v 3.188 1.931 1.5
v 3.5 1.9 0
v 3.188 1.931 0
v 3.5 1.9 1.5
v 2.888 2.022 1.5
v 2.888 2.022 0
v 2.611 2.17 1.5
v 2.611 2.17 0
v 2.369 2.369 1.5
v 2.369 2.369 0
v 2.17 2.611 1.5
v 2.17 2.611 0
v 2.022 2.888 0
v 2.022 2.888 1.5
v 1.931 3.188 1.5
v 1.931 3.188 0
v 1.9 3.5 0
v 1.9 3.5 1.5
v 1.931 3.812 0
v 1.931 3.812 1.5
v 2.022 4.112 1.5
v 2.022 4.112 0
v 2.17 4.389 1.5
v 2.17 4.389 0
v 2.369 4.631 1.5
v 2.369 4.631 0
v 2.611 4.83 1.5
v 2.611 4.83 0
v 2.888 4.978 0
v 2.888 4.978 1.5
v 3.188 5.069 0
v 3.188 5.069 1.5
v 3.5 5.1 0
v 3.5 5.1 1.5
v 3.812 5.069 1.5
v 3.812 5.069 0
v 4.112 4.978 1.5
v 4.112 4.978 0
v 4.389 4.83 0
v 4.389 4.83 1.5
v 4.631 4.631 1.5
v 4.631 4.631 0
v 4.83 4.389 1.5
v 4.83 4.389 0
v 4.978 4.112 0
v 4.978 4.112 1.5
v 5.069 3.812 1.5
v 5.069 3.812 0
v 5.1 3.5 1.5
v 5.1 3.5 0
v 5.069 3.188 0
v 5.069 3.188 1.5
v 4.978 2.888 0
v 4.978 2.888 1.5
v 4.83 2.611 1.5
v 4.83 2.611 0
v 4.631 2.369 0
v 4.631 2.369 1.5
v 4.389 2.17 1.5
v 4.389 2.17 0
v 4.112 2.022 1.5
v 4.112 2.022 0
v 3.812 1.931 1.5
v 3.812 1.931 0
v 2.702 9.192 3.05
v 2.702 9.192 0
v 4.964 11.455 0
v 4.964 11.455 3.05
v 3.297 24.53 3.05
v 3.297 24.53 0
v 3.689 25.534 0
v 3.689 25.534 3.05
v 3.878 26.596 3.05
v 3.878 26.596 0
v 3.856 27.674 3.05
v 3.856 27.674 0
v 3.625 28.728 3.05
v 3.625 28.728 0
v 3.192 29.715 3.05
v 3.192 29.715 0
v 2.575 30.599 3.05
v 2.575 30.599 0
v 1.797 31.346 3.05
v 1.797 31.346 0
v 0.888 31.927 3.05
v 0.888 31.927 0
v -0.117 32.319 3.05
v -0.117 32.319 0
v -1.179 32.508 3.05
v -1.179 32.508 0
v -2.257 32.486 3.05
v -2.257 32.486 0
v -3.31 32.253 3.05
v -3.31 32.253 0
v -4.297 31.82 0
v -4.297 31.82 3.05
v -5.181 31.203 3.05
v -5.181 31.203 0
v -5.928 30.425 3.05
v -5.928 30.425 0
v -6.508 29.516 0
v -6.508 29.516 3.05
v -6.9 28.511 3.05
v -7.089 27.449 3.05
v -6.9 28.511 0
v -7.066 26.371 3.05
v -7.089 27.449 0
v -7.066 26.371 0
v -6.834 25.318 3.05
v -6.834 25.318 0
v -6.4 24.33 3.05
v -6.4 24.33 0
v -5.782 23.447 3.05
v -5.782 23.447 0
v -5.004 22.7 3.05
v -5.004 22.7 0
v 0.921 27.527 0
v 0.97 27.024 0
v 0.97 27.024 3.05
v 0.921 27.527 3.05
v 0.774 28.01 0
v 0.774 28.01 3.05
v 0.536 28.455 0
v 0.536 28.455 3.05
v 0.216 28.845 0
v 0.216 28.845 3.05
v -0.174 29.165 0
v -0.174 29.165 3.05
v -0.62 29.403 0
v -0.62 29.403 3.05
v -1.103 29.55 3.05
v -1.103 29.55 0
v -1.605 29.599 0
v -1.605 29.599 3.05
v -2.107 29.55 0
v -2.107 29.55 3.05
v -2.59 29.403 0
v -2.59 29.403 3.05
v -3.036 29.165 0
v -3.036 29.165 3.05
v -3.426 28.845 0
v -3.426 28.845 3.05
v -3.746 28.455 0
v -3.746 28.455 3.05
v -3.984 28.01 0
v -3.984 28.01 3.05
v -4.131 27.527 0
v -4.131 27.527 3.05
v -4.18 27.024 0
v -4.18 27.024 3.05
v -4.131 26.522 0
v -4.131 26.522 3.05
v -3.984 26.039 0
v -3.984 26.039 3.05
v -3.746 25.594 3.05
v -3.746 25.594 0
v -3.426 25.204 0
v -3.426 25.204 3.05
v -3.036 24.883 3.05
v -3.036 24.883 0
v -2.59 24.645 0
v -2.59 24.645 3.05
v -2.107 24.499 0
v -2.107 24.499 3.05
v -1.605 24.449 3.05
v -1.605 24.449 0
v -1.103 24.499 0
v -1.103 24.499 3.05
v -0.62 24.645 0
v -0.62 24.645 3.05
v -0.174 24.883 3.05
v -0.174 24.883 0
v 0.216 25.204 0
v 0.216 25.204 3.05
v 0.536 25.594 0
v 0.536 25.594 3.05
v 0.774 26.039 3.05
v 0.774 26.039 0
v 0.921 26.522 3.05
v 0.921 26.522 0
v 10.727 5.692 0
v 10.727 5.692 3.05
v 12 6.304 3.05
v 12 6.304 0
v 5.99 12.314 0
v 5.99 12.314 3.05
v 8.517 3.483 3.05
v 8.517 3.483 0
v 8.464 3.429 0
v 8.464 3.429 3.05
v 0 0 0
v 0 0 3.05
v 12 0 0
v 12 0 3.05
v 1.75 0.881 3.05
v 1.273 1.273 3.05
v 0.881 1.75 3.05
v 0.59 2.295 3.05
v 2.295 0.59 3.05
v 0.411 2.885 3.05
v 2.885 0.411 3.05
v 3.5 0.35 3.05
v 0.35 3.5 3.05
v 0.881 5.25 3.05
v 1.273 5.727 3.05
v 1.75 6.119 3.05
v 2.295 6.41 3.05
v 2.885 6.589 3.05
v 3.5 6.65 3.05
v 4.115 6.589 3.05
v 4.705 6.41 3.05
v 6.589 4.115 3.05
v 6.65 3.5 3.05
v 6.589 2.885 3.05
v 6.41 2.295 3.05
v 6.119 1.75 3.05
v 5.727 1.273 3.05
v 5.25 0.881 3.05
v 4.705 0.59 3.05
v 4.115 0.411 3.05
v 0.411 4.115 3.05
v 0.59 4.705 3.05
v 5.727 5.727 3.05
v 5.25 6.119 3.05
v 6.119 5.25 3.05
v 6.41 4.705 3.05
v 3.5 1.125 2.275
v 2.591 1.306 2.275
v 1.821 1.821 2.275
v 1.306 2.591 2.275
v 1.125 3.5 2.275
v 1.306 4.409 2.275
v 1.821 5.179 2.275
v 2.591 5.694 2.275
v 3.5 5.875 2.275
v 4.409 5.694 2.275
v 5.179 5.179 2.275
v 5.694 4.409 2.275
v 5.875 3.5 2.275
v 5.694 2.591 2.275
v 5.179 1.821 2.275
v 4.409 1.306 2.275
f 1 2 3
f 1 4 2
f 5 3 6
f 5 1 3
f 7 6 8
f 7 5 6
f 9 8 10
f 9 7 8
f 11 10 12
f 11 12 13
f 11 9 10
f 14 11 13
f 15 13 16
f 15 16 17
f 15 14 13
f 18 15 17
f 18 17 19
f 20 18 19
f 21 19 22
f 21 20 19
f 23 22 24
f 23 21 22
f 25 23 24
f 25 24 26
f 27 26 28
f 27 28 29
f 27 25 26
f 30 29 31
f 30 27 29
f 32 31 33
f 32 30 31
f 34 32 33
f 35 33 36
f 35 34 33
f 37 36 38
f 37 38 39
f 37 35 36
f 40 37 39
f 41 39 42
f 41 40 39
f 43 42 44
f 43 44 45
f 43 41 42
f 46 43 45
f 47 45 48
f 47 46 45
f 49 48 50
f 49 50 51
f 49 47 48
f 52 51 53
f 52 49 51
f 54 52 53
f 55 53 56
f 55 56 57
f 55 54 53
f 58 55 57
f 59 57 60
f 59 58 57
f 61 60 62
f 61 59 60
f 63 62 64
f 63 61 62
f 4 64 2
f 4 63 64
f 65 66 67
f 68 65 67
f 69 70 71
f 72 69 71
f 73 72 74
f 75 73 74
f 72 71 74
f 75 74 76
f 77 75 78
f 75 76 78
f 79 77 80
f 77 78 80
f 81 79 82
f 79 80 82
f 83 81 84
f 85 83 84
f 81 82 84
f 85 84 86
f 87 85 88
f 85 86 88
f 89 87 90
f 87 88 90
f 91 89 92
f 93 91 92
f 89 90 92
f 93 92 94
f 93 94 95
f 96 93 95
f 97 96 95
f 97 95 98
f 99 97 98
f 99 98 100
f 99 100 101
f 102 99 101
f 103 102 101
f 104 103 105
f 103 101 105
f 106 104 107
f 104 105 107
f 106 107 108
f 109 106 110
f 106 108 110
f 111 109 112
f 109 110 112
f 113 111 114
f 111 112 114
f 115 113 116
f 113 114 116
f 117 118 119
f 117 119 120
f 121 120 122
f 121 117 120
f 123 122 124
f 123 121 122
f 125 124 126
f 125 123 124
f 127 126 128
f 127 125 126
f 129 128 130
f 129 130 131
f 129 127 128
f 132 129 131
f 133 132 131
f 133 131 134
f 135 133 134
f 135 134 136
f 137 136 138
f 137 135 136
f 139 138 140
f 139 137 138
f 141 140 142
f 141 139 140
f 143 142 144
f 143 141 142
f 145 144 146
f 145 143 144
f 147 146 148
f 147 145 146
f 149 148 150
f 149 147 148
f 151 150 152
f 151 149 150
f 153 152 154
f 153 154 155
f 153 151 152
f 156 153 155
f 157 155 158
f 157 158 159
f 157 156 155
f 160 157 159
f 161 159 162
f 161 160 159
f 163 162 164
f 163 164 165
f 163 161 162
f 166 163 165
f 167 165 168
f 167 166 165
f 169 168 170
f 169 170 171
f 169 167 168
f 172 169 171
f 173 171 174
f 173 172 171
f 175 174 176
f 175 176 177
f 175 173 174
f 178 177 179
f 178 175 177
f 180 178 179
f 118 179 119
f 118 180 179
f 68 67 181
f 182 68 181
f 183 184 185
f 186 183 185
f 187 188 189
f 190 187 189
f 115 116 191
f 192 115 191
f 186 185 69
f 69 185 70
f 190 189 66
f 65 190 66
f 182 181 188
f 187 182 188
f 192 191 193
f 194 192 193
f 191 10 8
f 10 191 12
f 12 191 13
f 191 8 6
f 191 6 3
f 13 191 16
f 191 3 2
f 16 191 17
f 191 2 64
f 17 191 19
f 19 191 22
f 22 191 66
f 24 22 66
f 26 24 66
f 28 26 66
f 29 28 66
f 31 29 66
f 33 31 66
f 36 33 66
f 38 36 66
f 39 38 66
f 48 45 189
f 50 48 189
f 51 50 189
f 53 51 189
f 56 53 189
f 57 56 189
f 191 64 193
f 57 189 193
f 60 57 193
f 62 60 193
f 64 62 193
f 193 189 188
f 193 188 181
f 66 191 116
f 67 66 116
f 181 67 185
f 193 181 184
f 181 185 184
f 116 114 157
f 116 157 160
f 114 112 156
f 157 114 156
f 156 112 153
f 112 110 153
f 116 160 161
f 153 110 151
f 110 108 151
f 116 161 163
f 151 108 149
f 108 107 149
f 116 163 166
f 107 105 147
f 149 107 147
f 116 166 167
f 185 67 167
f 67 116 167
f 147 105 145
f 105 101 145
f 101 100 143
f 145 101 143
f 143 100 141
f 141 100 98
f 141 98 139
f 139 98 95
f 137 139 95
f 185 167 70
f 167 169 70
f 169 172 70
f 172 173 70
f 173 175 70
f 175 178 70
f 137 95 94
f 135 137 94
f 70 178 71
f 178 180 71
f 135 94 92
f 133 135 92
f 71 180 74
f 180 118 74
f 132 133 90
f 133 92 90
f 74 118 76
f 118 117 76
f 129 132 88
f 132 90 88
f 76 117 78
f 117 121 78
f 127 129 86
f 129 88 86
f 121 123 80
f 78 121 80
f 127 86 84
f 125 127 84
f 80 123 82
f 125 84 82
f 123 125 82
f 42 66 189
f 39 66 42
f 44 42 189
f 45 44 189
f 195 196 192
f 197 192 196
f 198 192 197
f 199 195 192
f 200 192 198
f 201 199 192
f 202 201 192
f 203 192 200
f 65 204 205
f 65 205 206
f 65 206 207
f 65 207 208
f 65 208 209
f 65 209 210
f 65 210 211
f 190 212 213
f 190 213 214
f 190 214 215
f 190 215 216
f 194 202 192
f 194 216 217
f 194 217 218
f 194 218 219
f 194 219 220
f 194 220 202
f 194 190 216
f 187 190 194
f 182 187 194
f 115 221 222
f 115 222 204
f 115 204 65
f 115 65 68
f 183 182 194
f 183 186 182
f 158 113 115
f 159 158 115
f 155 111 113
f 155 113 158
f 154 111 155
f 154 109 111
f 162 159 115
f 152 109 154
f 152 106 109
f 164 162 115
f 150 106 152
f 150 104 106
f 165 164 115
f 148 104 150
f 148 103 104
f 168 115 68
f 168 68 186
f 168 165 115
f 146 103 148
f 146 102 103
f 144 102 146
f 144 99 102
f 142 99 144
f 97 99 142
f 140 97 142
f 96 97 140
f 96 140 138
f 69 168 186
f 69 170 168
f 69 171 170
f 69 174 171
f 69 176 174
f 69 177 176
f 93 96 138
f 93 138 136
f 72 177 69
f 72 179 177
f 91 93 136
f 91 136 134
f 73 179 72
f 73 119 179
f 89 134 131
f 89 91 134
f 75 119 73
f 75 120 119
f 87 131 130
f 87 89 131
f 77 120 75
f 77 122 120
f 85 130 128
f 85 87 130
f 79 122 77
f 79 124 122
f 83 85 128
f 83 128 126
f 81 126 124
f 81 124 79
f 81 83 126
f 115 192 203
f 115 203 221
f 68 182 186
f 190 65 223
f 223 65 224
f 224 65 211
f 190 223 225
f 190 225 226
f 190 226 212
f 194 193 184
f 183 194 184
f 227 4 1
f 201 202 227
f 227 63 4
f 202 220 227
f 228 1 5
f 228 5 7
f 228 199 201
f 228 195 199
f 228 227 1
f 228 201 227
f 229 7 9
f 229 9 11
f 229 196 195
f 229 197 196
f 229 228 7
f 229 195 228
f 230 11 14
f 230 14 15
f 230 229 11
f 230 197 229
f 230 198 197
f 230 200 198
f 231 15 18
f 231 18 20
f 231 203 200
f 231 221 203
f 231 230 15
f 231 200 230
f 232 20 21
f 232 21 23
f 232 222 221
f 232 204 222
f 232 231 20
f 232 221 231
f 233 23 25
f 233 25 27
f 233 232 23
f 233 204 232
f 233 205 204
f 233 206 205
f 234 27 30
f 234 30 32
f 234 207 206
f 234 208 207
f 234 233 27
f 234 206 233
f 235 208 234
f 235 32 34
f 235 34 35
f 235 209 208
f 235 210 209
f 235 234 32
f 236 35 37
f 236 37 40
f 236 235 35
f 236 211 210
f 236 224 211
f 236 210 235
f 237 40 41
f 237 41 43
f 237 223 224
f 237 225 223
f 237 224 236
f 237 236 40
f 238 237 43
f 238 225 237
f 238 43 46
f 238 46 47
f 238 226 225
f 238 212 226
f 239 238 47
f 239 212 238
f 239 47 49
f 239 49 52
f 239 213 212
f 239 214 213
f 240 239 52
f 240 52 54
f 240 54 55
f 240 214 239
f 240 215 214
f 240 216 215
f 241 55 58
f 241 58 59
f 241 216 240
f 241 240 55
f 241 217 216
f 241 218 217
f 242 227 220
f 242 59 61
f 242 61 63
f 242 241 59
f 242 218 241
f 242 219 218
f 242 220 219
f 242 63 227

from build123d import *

# Parameters (mm, degrees)
SKETCH1_R           = 1.5
SKETCH1_R_2         = 2.575
BOSS_EXTRUDE1_DEPTH = 3.05


with BuildPart() as part:
    # Sketch1 → Boss-Extrude1 (new body)
    with BuildSketch(Plane.XY):
        with BuildLine():
            Line((-5.003856518, 22.700252006), (0, 0))
            Line((0, 0), (12, 0))
            Line((12, 0), (12, 6.303908615))
            Line((12, 6.303908615), (5.98959236, 12.314316255))
            Line((5.98959236, 12.314316255), (3.296868681, 24.529995477))
            ThreePointArc((3.296868681, 24.529995477), (-2.788944901, 32.395396494), (-5.003856518, 22.700252006))
        make_face()
        with Locations((3.5, 3.5)):
            Circle(SKETCH1_R, mode=Mode.SUBTRACT)
        Polygon((10.727207794, 5.692209589), (8.517499103, 3.482500897), (8.464466094, 3.429467889), (2.701545827, 9.192388155), (4.964287527, 11.455129855), align=None, mode=Mode.SUBTRACT)
        with Locations((-1.604993243, 27.024339012)):
            Circle(SKETCH1_R_2, mode=Mode.SUBTRACT)
    extrude(amount=BOSS_EXTRUDE1_DEPTH)

    # Sketch3 → CSK for M3 Flat Head Machine Screw1 (revolve, cut)
    with BuildSketch(Plane(origin=(3.5, 3.5, 3.05), x_dir=(0, -1, 0), z_dir=(1, 0, 0))):
        Polygon((0, 0), (0, 3.05), (1.6, 3.05), (1.6, 1.55), (3.15, 0), align=None)
    revolve(axis=Axis((3.5, 3.5, 9.4), (0, 0, -1)), mode=Mode.SUBTRACT)


solid = part.part
